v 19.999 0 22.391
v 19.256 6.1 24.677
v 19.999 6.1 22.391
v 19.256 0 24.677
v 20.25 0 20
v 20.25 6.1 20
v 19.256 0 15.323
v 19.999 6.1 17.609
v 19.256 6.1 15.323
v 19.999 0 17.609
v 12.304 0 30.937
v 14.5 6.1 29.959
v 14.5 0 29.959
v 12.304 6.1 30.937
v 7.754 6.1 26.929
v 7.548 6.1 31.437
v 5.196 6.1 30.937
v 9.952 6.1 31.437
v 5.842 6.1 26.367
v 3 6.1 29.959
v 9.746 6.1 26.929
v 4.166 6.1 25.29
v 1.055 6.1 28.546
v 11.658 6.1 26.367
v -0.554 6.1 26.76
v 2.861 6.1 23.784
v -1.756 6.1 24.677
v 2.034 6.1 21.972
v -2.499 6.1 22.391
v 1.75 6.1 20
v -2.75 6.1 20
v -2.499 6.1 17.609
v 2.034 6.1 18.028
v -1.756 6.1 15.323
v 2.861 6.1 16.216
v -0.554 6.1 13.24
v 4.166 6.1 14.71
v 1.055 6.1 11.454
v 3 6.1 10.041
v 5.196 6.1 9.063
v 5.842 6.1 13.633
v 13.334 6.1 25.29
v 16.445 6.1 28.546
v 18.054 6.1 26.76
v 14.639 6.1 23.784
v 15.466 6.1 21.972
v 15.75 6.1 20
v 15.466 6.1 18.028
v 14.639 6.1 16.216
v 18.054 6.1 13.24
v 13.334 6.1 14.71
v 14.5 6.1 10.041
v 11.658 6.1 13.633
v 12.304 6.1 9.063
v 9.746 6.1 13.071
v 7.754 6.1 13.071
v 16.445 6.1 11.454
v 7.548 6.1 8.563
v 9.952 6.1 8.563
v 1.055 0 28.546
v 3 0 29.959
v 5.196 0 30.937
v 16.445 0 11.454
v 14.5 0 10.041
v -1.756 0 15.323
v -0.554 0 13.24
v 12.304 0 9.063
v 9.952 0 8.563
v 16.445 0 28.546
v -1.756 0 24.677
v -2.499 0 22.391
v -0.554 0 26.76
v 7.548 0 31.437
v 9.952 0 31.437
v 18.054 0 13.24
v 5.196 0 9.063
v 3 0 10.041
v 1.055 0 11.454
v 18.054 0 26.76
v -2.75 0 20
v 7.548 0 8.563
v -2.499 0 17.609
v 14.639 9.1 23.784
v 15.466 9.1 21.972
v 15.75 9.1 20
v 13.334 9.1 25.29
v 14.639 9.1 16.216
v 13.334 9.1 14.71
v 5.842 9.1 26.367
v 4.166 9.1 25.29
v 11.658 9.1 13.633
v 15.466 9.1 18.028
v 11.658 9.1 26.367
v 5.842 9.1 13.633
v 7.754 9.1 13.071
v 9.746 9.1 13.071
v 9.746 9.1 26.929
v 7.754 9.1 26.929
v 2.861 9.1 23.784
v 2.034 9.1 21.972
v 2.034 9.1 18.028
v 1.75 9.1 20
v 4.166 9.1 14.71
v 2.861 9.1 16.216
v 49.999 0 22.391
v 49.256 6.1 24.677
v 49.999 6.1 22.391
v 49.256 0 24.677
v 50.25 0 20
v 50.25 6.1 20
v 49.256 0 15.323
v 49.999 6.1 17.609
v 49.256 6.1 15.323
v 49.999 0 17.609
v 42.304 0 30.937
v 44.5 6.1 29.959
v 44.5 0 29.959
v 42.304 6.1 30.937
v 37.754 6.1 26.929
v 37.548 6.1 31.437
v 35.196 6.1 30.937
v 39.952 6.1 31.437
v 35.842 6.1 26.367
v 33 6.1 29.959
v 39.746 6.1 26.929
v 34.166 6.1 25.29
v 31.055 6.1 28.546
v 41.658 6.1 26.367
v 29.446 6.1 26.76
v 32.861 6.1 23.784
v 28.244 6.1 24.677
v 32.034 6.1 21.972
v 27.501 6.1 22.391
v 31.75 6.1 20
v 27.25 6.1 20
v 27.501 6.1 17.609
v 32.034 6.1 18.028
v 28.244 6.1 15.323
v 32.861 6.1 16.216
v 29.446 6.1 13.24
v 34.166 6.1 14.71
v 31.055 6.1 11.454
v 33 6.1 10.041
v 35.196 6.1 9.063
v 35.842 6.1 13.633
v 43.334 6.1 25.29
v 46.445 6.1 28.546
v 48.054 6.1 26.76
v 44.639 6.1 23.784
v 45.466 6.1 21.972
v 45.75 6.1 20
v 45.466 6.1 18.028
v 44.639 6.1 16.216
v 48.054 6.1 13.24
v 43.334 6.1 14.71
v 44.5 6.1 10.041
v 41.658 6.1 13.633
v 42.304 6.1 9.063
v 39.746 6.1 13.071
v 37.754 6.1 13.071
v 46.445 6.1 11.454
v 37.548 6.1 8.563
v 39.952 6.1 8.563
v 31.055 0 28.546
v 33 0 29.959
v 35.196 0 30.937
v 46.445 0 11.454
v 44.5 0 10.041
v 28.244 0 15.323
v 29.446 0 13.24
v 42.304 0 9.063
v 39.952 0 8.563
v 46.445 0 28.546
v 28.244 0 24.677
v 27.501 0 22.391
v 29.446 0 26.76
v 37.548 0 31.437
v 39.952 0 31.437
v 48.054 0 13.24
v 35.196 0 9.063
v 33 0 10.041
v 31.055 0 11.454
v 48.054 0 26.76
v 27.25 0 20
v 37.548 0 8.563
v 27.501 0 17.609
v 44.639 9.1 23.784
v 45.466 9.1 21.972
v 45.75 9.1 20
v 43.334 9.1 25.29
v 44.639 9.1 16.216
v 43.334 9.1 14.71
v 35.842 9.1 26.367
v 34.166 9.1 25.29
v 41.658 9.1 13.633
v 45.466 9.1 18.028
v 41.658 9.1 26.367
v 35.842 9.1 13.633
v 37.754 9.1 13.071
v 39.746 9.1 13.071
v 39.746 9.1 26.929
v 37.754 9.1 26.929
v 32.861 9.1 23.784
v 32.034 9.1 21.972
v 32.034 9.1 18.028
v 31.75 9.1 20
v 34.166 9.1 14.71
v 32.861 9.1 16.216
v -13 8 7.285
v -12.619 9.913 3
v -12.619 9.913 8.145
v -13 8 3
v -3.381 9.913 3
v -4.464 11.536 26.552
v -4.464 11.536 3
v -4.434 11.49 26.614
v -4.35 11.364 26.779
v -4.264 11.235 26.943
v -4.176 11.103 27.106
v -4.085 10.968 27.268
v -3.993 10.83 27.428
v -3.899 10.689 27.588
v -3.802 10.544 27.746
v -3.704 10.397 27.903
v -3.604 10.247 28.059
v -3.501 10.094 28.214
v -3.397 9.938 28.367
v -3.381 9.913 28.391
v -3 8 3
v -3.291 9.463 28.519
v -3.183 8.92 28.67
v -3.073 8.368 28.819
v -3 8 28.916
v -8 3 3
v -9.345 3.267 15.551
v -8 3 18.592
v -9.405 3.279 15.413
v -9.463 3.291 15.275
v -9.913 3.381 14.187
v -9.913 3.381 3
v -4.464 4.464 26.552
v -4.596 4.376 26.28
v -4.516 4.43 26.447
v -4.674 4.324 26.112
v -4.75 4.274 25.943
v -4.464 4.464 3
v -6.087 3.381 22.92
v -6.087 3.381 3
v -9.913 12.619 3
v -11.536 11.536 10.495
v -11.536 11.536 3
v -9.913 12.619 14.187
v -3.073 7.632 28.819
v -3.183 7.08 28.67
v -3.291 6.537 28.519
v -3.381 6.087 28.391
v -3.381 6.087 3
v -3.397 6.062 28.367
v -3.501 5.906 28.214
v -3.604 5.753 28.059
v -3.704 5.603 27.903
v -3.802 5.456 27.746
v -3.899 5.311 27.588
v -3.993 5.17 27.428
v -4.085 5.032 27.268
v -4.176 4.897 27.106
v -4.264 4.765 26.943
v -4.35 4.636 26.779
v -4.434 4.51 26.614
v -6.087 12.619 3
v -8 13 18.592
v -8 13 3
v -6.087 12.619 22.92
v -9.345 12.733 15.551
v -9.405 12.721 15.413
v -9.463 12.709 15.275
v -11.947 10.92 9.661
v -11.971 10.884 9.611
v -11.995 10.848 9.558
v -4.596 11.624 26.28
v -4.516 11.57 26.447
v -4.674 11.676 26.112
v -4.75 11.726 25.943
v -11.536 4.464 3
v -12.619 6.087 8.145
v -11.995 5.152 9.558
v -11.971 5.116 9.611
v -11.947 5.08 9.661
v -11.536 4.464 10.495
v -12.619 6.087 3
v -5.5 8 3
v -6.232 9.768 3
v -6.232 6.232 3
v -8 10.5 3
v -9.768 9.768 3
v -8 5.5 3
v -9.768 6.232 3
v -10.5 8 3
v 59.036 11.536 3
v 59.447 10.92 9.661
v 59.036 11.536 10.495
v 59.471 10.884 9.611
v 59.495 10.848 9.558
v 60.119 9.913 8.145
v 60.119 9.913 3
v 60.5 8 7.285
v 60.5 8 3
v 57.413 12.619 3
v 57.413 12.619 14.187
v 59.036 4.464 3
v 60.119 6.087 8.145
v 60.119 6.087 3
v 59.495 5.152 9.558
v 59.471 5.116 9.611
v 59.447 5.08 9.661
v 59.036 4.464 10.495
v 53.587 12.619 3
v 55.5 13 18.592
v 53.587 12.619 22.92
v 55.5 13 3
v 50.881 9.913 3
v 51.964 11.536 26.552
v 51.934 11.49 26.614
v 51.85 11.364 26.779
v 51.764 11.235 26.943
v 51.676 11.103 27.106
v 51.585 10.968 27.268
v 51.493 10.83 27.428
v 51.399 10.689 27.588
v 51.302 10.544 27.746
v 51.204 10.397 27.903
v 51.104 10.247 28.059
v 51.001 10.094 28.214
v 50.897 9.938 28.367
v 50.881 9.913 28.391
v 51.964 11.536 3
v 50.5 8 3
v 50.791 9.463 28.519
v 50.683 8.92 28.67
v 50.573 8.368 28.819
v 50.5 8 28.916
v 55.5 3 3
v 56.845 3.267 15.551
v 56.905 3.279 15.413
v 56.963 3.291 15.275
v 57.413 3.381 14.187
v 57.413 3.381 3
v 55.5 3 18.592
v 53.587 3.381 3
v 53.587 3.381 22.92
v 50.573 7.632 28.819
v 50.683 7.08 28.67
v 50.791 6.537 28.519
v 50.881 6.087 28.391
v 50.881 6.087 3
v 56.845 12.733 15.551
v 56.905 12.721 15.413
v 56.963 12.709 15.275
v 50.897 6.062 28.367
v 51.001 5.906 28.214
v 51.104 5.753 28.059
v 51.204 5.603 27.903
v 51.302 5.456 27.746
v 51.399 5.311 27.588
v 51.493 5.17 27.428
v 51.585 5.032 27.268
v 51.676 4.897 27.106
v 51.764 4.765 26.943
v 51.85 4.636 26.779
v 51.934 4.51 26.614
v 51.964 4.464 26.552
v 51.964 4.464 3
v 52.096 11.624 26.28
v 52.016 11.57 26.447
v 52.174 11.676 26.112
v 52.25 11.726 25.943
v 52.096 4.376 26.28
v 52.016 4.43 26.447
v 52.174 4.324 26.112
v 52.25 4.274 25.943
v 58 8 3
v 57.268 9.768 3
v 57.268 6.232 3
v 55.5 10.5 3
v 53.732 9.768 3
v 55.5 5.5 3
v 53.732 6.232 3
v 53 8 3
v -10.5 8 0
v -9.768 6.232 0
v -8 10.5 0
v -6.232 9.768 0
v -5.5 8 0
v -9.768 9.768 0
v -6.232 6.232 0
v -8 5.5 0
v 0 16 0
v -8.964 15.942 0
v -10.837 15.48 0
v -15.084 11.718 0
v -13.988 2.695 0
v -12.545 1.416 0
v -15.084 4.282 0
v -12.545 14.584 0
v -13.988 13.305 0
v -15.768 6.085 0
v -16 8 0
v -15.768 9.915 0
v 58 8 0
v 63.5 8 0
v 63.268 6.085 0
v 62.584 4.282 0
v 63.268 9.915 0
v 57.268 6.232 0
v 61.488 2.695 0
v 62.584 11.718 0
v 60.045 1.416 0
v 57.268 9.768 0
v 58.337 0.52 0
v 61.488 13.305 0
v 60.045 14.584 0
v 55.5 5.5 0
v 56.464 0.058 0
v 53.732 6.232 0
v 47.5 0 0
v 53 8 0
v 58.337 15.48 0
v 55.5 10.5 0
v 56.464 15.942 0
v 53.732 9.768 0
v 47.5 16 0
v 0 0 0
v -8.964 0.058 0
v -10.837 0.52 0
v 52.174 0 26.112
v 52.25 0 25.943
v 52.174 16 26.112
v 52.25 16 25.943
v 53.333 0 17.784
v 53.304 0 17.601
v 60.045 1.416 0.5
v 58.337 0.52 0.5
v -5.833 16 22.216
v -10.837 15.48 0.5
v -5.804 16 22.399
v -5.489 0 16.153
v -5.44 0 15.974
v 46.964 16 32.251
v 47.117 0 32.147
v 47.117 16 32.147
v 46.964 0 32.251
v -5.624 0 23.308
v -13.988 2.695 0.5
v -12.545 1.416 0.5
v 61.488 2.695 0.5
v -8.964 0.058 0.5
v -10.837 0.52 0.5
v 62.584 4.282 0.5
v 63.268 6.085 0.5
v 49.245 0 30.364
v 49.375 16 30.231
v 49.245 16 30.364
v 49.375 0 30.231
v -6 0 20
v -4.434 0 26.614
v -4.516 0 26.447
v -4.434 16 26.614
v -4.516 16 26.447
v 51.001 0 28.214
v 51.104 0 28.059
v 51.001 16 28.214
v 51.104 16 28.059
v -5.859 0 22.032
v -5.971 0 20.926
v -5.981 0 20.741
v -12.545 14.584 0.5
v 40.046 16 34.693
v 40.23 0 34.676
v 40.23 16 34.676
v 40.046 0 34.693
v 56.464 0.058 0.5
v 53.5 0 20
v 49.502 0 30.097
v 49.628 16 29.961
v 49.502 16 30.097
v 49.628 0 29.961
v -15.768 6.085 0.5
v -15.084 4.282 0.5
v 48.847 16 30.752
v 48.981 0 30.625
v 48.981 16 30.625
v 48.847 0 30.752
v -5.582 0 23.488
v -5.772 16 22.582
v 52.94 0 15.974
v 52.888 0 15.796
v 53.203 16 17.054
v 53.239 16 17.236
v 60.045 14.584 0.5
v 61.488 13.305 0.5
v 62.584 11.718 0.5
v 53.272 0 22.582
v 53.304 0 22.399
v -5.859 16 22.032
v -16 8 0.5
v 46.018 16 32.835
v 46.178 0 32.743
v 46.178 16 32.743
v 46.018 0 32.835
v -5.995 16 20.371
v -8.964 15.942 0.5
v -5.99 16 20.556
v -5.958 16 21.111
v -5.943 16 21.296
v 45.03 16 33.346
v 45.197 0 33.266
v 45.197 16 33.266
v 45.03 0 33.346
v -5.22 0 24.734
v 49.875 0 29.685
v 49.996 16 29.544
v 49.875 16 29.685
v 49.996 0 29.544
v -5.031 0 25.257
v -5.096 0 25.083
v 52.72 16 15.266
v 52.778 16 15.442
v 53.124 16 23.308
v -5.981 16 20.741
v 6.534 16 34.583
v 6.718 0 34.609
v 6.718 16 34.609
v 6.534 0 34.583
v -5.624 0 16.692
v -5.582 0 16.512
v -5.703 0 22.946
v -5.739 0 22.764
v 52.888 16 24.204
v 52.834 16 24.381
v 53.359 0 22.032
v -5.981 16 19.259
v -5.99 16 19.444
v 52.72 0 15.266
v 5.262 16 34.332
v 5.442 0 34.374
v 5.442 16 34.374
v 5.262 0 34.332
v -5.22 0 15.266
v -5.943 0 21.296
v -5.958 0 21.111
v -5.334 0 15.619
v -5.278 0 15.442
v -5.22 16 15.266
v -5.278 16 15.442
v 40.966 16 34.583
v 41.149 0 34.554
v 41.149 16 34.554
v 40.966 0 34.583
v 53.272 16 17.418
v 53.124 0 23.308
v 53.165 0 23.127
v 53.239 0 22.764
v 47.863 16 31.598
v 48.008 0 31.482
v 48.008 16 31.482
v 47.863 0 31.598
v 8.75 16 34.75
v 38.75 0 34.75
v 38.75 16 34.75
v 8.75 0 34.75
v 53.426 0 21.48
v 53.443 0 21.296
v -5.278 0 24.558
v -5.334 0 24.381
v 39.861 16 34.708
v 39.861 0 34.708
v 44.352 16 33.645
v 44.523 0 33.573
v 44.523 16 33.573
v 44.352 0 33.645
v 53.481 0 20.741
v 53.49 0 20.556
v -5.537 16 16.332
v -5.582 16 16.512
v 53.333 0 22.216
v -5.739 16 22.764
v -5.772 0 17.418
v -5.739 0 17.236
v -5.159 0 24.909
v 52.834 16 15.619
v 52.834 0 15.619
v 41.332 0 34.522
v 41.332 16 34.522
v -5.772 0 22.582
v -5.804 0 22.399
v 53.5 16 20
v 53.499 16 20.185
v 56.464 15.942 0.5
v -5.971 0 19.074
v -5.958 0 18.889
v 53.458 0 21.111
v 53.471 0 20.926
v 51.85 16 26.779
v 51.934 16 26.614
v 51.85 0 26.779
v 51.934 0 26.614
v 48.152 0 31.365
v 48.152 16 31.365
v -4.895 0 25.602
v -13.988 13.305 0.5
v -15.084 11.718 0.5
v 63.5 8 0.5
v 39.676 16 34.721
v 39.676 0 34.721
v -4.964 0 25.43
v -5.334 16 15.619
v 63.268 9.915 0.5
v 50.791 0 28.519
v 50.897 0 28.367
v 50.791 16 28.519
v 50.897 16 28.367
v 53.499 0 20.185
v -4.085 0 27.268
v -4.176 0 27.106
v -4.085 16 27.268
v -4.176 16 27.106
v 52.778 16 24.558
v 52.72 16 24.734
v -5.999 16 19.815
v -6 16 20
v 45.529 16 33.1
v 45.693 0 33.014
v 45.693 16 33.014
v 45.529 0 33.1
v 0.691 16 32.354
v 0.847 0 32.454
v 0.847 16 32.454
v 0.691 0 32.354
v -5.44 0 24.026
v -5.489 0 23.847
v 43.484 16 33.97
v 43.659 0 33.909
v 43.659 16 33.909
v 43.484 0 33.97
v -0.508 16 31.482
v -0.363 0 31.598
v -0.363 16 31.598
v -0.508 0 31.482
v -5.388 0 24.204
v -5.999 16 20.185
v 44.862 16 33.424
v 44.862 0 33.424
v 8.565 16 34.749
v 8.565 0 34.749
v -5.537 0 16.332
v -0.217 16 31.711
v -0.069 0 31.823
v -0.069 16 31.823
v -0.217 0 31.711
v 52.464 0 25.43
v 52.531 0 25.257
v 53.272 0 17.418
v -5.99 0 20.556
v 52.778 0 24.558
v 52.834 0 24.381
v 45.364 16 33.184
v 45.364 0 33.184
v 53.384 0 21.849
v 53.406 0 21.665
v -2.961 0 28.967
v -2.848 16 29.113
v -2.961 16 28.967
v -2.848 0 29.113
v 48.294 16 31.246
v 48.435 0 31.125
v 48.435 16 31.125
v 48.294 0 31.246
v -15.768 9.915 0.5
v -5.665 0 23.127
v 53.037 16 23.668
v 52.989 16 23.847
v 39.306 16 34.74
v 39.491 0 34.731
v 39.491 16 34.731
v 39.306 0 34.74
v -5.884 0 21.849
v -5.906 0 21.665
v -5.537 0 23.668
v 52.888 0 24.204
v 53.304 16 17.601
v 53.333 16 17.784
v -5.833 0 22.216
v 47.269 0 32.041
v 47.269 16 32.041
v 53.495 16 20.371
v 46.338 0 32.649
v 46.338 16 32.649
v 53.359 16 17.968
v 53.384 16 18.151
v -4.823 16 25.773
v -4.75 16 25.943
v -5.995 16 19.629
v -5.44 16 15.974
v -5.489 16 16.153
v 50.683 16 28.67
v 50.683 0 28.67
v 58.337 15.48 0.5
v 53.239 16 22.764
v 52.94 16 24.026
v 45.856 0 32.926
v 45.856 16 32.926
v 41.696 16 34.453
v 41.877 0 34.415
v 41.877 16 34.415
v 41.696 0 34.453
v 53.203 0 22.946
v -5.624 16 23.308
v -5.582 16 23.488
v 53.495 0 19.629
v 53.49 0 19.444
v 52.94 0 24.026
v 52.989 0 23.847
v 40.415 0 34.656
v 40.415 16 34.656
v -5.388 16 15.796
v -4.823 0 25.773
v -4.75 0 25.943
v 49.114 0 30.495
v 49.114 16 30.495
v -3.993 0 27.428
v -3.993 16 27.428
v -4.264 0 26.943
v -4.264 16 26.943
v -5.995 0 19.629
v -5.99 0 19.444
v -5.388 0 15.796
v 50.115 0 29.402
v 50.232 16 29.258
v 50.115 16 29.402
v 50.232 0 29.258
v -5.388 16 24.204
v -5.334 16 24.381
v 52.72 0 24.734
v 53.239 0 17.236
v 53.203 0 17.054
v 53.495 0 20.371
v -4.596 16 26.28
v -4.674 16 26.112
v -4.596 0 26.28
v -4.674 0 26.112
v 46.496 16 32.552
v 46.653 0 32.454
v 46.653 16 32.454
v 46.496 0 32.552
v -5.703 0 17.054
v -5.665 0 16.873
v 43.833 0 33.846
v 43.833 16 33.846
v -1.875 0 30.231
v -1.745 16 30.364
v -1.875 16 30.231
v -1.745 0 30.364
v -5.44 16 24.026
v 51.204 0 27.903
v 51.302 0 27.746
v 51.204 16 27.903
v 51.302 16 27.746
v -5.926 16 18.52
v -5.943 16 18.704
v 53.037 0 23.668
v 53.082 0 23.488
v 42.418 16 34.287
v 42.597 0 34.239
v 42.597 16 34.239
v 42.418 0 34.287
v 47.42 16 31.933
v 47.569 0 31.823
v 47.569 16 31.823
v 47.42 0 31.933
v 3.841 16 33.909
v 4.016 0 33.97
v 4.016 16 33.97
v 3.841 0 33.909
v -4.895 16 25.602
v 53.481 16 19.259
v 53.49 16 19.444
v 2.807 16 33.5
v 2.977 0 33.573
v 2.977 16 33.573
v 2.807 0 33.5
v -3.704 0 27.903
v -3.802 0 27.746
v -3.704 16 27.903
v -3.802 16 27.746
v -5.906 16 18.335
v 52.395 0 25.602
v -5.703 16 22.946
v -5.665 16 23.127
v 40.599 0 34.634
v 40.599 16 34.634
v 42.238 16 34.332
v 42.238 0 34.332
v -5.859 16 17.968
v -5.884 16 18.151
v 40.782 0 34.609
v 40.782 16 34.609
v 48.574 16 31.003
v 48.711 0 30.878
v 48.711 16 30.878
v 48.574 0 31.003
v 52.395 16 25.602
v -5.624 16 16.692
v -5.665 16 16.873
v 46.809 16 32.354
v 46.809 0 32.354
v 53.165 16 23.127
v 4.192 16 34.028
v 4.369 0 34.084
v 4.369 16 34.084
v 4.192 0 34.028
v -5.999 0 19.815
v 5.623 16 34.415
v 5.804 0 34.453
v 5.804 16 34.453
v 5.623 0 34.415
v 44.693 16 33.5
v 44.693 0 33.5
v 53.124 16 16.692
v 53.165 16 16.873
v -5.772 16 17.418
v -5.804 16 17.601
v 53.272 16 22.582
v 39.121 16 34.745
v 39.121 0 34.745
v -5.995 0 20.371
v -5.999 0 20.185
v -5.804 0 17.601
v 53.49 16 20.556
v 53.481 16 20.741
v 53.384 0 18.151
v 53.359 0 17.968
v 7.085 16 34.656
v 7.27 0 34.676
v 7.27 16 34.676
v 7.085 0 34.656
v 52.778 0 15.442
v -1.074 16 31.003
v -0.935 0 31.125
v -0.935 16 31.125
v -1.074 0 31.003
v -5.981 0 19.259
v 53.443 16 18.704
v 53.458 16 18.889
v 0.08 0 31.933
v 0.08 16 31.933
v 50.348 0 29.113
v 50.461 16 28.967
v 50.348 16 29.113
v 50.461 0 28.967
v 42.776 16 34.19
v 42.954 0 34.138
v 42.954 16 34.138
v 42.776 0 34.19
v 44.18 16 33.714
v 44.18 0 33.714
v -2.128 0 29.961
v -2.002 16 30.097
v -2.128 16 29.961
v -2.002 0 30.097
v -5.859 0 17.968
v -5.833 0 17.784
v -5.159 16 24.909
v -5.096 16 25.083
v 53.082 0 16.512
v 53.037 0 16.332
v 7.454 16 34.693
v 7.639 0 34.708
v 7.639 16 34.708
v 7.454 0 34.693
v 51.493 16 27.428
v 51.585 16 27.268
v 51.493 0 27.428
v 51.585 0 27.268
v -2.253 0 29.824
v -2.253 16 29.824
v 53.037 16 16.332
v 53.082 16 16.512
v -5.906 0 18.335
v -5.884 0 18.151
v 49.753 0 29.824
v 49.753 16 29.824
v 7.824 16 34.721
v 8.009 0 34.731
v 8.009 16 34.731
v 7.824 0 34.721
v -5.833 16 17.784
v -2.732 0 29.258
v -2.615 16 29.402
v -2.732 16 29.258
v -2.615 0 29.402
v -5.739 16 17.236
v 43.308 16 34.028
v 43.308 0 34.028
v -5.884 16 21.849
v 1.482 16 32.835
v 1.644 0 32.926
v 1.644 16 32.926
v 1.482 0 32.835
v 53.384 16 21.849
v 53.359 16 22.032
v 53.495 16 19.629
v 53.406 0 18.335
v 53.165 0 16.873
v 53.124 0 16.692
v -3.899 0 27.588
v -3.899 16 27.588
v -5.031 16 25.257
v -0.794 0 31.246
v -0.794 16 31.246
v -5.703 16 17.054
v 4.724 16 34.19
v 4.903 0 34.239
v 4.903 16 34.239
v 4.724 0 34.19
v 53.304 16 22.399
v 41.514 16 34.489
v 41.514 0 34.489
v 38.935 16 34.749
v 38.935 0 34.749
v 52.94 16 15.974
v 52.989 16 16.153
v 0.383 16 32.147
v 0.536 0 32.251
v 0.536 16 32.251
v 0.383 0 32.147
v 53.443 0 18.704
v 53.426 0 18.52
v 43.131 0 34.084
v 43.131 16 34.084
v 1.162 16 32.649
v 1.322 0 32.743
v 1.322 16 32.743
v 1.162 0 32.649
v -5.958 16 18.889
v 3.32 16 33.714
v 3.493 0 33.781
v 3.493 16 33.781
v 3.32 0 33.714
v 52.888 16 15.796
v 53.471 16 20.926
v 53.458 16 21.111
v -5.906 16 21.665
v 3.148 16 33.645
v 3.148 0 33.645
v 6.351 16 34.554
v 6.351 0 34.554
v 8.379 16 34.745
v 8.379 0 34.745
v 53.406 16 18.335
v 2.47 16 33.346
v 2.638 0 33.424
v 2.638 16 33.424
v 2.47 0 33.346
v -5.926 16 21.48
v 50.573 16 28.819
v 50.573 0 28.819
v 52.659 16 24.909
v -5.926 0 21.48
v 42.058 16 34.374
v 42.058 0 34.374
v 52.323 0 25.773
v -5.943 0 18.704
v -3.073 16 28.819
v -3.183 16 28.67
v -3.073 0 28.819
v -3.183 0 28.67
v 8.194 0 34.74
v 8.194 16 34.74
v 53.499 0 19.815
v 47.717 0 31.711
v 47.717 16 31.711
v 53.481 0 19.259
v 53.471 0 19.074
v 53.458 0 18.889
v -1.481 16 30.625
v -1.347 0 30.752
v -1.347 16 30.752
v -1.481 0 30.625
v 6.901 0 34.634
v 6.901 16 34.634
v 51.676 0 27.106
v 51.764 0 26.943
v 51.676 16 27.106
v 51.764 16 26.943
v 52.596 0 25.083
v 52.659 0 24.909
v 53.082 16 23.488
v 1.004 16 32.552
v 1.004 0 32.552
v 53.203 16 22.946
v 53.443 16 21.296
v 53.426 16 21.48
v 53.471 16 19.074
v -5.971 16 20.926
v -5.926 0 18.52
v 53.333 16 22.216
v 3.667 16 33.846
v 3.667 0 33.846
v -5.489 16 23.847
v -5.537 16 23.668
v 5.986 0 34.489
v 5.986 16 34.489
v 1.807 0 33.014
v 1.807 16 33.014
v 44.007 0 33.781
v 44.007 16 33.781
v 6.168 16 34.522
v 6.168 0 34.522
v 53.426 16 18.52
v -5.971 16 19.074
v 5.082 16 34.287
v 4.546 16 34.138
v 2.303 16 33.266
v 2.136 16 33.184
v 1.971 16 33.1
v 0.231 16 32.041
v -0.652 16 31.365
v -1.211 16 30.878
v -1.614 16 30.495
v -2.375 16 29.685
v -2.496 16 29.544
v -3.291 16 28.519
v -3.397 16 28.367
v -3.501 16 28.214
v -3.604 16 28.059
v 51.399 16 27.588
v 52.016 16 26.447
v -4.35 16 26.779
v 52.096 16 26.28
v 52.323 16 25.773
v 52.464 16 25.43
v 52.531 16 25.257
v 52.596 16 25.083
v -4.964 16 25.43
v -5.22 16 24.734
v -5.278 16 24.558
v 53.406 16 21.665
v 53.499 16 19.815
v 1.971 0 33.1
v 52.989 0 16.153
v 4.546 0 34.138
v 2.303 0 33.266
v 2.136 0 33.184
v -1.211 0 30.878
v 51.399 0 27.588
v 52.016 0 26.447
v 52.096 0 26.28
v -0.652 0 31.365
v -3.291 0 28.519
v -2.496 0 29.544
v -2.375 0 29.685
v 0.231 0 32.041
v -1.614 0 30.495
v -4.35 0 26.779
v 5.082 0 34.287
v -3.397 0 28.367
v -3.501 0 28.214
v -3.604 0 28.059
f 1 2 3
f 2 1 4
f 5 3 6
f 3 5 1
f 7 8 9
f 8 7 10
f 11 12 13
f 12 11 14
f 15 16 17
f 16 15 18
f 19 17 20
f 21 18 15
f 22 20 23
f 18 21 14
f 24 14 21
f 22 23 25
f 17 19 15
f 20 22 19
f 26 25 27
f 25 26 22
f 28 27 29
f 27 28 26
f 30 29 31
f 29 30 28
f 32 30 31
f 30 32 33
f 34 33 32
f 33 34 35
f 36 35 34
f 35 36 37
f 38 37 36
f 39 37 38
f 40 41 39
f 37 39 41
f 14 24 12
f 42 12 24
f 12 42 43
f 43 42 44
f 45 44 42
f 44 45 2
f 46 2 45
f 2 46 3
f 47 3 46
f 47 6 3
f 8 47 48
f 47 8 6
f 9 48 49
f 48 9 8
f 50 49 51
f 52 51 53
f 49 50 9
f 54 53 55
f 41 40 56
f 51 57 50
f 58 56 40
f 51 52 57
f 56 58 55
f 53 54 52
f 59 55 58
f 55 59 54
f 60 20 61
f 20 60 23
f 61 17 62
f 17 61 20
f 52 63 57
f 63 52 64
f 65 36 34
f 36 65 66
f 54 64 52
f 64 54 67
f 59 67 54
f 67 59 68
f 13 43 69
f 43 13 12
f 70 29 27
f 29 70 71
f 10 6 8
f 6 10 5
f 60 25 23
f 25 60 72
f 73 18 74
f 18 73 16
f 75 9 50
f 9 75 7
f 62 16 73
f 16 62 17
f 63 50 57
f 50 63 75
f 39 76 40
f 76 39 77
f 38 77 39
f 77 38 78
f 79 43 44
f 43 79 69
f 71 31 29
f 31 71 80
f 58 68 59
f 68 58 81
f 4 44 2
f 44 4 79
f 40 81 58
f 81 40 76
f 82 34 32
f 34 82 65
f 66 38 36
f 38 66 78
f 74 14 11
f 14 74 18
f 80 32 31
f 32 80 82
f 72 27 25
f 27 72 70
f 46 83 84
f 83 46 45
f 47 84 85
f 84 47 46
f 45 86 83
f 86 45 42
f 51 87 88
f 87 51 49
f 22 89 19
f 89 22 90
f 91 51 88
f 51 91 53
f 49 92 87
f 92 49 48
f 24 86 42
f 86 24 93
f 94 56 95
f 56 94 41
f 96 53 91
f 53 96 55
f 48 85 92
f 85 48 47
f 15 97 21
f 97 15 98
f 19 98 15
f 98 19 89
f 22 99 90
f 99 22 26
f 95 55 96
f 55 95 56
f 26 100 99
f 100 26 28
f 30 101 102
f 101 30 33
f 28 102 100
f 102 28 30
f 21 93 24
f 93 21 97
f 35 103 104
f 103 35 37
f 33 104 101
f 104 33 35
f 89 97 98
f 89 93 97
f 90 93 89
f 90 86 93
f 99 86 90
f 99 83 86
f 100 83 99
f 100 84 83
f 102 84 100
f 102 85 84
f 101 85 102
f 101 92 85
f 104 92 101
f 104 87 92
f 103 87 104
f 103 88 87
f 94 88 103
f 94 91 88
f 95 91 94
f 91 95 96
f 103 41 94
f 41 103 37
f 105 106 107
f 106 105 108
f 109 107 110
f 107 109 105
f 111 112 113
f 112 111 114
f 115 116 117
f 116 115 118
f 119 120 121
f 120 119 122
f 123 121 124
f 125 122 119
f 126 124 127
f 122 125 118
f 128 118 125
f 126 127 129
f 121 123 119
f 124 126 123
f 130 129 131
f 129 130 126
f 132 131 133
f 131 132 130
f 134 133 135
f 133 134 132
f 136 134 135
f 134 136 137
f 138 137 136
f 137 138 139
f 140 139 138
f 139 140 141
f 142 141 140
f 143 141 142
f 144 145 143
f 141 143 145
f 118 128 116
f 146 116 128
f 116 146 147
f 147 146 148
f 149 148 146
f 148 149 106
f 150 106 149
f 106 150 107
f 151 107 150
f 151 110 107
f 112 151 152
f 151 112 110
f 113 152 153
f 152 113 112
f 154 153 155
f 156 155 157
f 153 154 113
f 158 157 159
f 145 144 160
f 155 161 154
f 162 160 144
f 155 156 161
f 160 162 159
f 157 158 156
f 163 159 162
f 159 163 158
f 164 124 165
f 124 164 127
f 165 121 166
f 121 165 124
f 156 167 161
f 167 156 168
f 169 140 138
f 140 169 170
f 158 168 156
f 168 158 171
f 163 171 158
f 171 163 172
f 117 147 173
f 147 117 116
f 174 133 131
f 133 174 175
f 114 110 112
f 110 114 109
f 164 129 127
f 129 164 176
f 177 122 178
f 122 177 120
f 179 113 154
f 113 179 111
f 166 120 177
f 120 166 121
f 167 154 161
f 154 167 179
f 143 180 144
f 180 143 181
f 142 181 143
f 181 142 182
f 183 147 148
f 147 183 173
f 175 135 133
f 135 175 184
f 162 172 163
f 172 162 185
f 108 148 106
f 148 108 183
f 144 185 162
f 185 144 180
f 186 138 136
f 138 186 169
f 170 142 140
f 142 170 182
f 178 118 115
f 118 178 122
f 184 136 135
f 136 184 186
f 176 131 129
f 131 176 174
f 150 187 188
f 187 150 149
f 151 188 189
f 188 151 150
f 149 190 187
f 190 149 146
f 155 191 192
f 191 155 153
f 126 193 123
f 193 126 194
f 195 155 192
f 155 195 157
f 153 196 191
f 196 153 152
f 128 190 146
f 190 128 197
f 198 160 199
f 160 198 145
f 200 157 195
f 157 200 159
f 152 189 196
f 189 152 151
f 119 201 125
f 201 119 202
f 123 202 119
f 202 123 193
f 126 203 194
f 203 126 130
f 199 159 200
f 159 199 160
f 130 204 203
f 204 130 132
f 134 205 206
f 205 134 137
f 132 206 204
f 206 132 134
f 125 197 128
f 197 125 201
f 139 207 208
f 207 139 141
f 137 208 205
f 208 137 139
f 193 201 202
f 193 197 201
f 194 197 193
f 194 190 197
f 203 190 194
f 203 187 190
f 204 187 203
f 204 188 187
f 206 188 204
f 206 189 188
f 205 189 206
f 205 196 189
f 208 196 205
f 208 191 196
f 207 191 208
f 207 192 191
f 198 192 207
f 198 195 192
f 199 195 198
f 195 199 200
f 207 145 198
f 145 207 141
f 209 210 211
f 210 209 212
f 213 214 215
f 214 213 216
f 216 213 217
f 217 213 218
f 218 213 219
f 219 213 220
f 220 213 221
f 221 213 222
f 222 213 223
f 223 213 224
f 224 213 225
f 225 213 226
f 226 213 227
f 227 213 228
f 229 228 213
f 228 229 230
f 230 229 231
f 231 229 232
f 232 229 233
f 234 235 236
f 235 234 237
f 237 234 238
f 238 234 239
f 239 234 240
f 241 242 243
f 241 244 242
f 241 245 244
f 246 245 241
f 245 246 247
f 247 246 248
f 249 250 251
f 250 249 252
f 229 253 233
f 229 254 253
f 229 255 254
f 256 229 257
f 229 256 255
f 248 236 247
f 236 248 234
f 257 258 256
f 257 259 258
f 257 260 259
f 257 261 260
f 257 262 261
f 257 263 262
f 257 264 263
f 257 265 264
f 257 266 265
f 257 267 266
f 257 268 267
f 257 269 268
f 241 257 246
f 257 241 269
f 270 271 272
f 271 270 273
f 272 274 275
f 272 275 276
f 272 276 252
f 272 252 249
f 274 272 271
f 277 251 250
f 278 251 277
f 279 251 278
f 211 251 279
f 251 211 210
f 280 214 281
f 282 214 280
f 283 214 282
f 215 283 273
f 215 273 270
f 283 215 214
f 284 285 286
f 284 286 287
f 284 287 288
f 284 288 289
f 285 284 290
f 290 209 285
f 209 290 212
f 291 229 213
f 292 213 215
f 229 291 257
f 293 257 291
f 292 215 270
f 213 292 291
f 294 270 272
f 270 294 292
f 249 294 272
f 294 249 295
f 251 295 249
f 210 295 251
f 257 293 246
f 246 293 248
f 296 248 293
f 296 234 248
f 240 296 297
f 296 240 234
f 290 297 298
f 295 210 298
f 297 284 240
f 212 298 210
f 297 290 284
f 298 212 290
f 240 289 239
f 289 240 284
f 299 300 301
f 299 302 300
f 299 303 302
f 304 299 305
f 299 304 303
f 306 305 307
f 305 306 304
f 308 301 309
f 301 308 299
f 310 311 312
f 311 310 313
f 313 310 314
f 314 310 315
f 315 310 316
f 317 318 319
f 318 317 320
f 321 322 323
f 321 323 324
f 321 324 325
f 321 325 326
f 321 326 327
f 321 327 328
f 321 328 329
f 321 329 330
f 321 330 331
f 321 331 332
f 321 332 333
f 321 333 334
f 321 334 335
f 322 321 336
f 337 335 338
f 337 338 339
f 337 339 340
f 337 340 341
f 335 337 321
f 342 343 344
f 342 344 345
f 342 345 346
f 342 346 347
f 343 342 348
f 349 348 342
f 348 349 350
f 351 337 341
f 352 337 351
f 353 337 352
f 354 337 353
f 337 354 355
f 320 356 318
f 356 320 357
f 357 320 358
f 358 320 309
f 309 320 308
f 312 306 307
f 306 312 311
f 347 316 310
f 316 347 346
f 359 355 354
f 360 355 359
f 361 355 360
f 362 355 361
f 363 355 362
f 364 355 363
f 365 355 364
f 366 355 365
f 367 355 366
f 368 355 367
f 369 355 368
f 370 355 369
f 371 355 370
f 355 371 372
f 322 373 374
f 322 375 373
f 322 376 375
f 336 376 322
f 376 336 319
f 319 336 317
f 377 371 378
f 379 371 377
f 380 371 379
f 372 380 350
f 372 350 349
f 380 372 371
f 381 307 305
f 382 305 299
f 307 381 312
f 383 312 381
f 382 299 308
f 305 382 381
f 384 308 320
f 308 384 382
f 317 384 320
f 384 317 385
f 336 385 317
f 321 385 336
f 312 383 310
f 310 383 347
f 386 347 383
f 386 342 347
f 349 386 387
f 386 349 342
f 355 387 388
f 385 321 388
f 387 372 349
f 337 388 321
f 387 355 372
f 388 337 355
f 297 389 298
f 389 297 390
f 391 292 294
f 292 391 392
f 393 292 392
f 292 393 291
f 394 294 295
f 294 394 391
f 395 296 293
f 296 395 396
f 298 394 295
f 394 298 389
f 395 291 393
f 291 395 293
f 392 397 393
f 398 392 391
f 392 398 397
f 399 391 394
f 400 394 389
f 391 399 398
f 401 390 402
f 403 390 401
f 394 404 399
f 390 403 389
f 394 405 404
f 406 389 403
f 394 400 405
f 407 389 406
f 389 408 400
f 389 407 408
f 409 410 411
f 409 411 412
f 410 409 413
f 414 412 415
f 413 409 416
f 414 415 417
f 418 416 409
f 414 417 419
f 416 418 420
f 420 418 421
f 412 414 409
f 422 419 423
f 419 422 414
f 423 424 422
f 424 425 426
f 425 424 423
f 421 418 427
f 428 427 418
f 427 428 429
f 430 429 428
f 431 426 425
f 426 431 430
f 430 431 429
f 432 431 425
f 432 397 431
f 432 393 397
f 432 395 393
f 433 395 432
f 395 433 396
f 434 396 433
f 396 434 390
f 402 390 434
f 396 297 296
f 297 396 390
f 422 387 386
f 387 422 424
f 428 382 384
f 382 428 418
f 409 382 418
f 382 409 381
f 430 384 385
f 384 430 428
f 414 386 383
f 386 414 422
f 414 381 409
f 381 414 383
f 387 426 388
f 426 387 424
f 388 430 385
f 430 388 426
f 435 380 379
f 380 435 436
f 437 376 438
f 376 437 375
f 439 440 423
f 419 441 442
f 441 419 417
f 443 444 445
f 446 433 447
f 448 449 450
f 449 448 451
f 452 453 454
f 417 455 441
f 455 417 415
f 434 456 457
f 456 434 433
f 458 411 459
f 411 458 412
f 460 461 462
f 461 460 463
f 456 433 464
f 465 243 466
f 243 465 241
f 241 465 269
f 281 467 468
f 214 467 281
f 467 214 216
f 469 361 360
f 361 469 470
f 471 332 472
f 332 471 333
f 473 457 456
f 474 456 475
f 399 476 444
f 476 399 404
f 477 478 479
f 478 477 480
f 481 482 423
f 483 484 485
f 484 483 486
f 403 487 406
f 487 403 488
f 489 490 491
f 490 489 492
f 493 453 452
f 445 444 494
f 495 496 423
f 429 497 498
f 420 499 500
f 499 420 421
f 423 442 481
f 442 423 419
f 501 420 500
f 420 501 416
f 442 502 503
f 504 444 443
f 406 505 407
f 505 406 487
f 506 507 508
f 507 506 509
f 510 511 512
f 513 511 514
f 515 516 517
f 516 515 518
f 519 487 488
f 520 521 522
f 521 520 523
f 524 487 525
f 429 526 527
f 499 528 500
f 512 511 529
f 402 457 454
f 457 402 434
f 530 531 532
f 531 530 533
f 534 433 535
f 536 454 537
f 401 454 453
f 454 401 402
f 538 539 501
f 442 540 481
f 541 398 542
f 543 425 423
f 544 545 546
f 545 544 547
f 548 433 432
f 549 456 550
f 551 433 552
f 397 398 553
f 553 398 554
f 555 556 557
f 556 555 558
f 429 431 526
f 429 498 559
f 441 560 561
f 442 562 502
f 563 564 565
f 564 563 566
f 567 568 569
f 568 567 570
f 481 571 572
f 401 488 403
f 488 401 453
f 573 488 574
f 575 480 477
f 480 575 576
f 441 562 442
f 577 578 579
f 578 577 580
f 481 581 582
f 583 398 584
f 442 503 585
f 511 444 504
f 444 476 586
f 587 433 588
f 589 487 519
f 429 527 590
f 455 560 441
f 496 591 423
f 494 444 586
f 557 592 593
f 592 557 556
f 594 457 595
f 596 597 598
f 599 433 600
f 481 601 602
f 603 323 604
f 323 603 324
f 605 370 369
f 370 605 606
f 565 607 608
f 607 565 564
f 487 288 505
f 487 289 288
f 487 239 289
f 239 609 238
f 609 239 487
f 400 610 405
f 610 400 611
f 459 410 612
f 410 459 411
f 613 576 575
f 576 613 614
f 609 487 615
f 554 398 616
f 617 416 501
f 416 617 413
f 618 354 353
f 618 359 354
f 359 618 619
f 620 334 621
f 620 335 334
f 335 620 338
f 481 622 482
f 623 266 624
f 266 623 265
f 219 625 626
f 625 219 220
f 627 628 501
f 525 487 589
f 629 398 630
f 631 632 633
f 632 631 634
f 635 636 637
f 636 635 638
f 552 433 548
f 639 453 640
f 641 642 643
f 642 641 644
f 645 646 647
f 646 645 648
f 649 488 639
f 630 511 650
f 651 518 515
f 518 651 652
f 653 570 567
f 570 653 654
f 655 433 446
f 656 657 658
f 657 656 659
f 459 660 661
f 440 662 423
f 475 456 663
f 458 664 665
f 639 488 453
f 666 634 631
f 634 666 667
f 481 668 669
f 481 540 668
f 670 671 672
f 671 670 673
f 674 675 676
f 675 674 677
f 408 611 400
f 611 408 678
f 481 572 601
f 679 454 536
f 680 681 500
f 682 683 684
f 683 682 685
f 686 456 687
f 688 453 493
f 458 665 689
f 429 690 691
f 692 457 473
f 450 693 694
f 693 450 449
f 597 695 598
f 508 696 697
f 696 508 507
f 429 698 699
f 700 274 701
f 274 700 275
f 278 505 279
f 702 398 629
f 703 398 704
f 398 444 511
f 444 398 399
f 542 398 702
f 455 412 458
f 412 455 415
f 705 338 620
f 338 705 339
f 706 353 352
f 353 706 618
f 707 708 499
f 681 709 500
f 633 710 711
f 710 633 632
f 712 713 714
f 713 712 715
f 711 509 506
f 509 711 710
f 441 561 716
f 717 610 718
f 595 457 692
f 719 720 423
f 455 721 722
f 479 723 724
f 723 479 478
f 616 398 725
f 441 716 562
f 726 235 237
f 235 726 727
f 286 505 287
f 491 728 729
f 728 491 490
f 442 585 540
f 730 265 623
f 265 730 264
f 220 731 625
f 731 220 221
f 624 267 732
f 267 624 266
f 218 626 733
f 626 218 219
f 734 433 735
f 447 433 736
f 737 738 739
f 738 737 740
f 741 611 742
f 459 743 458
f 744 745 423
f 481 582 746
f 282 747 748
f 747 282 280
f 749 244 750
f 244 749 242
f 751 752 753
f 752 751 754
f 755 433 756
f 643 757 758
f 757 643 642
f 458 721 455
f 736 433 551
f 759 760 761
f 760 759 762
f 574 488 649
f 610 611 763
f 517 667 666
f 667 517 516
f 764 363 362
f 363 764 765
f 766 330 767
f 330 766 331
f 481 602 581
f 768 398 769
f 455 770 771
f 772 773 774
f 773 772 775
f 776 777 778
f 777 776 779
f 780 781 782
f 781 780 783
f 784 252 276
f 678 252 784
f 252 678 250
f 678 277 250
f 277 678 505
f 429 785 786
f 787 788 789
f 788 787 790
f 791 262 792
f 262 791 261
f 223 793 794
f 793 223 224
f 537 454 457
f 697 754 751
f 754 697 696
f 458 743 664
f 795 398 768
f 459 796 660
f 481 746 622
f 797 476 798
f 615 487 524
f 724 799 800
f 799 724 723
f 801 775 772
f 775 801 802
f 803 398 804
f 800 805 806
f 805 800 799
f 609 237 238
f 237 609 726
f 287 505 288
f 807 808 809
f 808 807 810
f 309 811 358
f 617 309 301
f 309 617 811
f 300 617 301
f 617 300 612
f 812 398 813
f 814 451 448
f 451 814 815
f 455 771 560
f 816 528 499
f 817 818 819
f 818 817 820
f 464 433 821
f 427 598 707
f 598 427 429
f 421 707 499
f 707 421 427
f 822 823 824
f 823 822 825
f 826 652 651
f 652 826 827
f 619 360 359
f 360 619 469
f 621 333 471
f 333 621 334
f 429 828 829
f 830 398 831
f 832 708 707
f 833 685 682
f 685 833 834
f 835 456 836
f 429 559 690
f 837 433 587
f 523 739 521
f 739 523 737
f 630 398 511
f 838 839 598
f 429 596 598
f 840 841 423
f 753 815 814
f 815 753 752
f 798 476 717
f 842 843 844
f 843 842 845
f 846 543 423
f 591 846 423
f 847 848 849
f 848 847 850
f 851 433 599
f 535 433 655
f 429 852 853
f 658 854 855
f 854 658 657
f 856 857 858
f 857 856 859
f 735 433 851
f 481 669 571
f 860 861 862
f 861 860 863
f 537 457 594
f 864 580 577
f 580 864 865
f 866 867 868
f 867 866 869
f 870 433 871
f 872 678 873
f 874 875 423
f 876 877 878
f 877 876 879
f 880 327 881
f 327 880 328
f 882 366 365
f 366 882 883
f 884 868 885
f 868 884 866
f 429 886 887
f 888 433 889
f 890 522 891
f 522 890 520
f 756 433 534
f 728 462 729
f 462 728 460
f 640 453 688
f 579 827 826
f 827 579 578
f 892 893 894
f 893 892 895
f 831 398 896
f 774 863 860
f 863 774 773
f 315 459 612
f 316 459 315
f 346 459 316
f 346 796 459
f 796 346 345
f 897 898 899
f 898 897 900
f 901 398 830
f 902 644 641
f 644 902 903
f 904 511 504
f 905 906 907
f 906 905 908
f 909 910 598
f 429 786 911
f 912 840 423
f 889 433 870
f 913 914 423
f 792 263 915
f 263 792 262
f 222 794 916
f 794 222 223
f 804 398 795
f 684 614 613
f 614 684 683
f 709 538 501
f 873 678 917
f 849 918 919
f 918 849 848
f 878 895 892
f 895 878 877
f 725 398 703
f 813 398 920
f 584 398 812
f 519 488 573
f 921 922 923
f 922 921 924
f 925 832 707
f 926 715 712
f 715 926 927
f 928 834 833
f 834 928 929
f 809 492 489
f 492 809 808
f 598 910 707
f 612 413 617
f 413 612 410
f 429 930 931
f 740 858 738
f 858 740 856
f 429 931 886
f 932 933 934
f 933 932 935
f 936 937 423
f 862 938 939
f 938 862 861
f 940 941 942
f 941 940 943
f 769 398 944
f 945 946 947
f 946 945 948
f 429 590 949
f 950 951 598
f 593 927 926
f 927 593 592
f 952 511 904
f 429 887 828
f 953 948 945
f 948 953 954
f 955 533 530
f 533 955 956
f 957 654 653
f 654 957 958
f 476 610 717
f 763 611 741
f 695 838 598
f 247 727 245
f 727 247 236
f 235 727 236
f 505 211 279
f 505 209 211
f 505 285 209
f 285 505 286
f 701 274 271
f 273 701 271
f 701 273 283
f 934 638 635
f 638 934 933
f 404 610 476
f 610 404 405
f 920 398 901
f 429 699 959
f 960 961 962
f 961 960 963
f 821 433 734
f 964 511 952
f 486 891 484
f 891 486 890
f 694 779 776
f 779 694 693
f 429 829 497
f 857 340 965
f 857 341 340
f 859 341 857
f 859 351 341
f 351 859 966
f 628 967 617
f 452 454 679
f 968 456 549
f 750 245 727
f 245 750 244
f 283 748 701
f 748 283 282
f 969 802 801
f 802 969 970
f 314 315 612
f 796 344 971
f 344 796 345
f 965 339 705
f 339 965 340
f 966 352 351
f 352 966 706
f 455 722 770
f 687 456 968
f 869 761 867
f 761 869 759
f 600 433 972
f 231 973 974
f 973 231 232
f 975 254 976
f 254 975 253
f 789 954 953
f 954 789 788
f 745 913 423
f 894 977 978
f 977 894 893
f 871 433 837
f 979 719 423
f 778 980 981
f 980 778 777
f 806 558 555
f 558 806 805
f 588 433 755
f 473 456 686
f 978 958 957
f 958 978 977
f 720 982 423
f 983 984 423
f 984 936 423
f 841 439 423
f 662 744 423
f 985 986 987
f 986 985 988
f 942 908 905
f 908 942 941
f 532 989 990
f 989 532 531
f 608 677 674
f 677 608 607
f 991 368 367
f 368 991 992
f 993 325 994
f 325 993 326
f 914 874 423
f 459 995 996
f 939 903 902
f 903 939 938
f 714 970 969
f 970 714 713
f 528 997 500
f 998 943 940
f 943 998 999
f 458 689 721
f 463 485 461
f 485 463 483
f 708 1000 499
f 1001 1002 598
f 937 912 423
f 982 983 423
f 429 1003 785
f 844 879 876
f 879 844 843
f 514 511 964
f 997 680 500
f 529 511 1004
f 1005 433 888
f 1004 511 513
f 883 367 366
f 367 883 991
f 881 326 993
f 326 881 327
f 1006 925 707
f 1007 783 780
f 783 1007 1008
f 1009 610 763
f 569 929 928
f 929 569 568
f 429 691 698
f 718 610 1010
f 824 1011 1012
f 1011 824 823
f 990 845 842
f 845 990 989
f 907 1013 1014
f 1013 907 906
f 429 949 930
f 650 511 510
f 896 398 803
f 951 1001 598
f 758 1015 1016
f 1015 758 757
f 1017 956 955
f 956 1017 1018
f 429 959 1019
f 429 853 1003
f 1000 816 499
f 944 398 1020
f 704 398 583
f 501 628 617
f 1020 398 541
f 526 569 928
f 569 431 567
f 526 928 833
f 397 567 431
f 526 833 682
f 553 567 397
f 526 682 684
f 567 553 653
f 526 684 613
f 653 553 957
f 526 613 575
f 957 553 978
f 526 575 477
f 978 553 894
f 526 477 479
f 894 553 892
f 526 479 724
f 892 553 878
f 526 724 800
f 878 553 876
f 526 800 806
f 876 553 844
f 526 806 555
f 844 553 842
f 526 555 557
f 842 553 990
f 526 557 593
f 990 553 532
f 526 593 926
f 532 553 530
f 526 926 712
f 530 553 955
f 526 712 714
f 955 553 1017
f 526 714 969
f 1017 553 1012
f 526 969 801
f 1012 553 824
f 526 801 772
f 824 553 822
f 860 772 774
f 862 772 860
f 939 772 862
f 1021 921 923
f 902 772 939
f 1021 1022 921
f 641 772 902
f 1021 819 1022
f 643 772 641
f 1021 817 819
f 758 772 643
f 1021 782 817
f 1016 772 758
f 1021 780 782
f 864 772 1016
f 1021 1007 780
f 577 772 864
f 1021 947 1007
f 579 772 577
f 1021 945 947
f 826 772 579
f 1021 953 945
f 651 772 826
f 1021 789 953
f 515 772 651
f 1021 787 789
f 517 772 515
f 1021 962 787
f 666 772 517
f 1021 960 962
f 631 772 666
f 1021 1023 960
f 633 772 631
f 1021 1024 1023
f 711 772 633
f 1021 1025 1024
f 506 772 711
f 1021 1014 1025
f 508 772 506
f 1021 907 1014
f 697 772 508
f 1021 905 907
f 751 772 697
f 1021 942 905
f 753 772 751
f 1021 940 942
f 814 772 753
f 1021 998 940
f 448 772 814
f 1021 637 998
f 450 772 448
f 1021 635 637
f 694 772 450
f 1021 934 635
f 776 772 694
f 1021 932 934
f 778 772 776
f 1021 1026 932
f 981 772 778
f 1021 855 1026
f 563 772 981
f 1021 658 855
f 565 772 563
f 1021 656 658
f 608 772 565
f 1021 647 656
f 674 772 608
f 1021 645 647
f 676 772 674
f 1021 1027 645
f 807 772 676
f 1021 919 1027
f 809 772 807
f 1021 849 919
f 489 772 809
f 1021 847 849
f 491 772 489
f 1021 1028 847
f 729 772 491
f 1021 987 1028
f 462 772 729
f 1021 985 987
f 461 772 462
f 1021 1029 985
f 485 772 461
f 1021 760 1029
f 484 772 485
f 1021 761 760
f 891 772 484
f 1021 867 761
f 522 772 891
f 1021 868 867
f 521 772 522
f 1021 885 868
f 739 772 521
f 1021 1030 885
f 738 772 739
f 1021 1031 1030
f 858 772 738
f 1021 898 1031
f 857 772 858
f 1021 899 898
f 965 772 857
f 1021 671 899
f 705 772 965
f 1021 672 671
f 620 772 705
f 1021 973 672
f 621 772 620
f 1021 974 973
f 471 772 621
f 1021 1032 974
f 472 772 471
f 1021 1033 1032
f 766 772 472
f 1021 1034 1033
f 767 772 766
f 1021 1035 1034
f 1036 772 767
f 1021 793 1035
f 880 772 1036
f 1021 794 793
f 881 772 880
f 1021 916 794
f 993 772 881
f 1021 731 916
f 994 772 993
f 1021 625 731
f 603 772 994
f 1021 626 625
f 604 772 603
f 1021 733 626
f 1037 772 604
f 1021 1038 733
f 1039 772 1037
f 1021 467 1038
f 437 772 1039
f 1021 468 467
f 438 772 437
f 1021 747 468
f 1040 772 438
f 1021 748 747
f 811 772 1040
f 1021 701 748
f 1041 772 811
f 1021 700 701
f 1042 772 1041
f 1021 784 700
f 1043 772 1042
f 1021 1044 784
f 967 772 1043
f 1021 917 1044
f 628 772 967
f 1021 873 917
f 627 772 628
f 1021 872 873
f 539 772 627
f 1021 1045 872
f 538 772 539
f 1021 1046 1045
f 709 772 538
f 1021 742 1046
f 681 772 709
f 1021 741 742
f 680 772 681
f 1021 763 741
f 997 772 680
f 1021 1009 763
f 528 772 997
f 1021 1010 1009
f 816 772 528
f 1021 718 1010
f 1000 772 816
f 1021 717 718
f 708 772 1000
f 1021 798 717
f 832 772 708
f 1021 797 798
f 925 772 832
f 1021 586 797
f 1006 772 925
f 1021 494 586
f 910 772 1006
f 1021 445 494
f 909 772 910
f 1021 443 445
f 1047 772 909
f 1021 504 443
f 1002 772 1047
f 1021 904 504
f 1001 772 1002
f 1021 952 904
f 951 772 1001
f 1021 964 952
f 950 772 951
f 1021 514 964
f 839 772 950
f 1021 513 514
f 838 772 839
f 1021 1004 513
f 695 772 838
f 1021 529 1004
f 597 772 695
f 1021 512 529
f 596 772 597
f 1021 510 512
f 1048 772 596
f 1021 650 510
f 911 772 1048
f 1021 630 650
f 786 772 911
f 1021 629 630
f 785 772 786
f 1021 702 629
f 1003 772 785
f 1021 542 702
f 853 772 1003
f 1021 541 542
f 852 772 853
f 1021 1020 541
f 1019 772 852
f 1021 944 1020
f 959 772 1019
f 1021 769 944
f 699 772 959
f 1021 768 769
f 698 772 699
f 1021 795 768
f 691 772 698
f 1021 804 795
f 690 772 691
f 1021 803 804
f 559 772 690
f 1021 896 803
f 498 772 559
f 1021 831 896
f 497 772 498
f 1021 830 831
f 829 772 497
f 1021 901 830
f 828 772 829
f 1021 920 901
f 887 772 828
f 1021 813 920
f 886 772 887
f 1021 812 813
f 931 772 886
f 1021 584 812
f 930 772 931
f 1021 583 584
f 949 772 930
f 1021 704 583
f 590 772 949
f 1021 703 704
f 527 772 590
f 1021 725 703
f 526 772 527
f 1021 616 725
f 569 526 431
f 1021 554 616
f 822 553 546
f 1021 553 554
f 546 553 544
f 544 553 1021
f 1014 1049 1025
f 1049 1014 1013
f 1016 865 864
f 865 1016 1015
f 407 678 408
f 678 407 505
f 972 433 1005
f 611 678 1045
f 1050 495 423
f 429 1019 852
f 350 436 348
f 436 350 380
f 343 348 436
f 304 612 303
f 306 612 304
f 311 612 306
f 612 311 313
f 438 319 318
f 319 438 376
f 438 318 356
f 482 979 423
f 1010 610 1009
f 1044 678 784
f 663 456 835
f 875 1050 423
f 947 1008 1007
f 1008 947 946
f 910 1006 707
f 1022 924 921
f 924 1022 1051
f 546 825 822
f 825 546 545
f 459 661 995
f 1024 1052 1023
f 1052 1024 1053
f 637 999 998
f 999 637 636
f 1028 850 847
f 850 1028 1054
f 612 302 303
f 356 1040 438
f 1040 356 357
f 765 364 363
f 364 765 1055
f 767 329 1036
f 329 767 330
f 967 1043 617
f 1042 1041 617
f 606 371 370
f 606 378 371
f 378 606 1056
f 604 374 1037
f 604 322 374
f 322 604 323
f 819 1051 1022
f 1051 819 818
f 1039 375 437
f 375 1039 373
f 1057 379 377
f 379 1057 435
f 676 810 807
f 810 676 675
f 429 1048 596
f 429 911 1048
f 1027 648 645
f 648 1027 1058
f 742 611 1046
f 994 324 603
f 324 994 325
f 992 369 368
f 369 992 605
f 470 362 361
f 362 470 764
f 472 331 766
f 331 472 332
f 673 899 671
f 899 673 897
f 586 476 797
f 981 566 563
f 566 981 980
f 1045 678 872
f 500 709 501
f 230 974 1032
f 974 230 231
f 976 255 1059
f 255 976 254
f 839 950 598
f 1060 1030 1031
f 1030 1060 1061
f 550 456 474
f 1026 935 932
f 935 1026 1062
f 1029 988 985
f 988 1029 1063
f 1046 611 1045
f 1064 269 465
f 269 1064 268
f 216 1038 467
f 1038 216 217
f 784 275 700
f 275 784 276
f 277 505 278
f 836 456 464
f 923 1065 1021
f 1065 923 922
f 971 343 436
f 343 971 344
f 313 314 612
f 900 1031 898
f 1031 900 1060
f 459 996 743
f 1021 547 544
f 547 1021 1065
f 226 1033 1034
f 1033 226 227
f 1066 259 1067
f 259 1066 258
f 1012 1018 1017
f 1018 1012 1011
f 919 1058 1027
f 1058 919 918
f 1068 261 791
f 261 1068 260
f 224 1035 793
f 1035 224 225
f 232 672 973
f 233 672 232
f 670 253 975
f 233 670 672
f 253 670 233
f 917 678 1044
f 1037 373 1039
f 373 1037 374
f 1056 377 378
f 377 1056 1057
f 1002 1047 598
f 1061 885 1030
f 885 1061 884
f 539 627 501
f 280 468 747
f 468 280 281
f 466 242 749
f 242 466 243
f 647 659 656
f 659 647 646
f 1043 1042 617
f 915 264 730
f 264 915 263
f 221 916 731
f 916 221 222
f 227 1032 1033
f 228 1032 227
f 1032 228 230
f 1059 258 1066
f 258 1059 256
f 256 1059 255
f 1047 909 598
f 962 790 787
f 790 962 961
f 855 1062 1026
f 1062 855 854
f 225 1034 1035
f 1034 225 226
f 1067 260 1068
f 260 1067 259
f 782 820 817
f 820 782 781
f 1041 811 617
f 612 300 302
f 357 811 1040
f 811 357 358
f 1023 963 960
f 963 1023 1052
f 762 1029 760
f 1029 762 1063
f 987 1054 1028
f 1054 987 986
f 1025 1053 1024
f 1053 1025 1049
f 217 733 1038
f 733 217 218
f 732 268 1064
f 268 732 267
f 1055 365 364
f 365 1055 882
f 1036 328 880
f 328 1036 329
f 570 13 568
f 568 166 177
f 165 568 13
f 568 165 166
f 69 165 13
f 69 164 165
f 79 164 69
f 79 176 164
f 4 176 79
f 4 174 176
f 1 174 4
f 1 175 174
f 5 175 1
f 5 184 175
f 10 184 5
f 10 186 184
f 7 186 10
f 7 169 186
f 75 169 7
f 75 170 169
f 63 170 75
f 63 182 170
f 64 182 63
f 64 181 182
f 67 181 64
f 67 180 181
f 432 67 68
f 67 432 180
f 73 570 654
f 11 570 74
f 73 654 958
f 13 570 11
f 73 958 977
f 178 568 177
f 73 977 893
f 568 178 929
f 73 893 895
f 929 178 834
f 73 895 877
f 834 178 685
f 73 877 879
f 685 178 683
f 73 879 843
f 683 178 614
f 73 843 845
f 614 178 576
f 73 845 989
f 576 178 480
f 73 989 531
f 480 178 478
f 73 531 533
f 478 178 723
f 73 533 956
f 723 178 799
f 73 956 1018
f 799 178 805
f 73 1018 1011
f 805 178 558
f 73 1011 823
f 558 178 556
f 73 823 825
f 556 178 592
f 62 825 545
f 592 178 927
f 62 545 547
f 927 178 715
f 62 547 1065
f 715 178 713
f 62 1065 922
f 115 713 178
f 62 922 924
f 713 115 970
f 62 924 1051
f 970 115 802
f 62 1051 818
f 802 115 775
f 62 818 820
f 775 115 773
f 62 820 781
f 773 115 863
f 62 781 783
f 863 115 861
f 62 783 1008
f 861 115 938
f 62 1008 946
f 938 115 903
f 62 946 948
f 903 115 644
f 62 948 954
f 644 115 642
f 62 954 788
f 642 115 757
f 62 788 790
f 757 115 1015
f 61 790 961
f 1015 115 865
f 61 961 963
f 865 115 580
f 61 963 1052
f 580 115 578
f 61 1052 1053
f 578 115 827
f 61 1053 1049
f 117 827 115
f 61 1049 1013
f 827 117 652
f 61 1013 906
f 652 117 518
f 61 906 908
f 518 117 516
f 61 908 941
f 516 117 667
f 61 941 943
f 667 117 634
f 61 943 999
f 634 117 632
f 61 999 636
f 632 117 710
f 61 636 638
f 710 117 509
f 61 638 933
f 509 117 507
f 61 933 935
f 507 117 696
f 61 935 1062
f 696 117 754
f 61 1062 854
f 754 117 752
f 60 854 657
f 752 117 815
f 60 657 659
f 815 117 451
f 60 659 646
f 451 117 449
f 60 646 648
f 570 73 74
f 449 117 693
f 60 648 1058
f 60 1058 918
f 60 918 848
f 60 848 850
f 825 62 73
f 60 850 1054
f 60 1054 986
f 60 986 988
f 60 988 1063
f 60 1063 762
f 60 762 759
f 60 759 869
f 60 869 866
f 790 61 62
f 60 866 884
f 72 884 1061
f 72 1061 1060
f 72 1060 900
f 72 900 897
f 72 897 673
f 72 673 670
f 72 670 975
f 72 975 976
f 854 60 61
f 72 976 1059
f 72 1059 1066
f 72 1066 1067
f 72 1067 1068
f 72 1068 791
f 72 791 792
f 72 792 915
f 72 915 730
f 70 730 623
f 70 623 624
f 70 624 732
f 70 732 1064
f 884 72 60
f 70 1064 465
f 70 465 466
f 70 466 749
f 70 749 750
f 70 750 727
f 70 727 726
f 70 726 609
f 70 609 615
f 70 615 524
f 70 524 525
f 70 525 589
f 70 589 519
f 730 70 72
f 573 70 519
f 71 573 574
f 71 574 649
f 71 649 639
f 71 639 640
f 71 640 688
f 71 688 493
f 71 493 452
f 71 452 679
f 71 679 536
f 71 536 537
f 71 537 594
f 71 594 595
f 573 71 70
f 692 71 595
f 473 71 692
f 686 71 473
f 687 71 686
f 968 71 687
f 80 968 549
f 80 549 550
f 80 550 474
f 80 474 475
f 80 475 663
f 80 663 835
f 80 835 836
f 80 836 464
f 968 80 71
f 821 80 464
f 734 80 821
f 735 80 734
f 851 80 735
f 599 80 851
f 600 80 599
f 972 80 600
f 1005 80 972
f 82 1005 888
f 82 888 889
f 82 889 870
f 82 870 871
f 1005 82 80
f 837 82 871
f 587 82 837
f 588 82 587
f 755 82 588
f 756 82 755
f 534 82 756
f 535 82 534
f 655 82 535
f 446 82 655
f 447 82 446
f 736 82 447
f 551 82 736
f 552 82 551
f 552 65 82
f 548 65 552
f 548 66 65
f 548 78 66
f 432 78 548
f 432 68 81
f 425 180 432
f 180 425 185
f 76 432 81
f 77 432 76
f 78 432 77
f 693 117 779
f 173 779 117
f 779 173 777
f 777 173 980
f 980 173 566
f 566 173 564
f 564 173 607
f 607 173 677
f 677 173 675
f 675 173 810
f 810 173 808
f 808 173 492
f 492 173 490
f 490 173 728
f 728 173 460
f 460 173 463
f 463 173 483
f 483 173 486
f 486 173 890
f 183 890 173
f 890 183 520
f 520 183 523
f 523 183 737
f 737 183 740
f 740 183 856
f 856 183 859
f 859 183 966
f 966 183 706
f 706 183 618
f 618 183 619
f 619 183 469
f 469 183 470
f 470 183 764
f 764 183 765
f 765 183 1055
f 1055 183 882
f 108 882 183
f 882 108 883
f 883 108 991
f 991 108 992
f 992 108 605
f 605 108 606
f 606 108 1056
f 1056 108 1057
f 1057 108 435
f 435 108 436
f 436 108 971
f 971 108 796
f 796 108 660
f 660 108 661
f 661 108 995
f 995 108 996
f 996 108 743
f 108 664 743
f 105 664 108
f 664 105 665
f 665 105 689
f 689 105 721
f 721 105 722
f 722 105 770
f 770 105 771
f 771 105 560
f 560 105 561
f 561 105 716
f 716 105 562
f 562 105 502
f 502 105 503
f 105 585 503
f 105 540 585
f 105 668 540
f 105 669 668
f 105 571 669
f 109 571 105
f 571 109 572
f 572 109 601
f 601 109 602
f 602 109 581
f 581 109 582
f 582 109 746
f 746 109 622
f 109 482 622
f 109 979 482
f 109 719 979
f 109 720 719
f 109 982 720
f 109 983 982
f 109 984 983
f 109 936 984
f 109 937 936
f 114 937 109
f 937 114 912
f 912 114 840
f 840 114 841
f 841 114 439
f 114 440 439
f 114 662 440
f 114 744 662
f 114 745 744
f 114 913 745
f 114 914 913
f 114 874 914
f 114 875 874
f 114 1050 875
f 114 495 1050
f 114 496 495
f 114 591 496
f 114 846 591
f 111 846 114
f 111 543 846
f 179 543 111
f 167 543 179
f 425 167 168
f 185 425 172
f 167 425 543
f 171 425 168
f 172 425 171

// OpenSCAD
// Essential parameters:
bearing_qty = 2;
bearing_height = 20; // Height to elevate bearing hub
bearing_radius = 11.5; // Bearing radius
bearing_depth = 7.1; // Bearing depth
bearing_gap_radius = 7; // Extra gap for hub of bearing radius

screw_radius = 2.5;
screw_head_radius = 5;

// Advanced options:
mount_thickness = 3; // Thickness of mount parts
mount_screw_distance_multiple = 2.5; // Distance of mount screws from front
rear_support = 0; // 0 for no rear support, 1 for rear support.

// Derived properties:
base_height = mount_thickness;
riserWidth = bearing_radius + mount_thickness * 2;
riserHeight = bearing_height + bearing_radius + mount_thickness;
screw_distance = mount_screw_distance_multiple * riserHeight;
side_screw_area_r = screw_head_radius + mount_thickness;
base_depth = side_screw_area_r * 2;

// THE CODE:
theModel(bearing_qty, 30);

module theModel(quantity, distance){
  difference(){
    body(quantity, distance);
    holes(quantity, distance);
  }
}

module body (quantity, distance) {
  hull(){
    for(x=[0:quantity-1]){

      translate([x * distance, 0, 0])
        supportTower(x, distance);


      if (rear_support == 1)
      translate([x * distance, 0, 0])
      base(quantity, distance);
    }

    sideScrewSupports(quantity,
                      distance,
                      side_screw_area_r,
                      0.5);
  }
}

module sideScrewSupports( quantity, distance, base_radius, thickness ){

  first_offset = side_screw_area_r * -1;
  sideCylinder( first_offset, thickness, base_radius );

  second_offset = distance * (quantity-1) + riserWidth + side_screw_area_r;
  sideCylinder( second_offset, thickness, base_radius );

}

module sideCylinder( centerOffset, height, radius ) {
  translate([centerOffset, side_screw_area_r, 0])
  cylinder(r=radius, h=height);
}


module holes (quantity, distance) {
  for(x=[0:quantity-1]){
    translate([x * distance, 0, 0])
    bearingHole();

    translate([x * distance, 0, 0])
    mountScrewHole(screw_radius);
  }

  for(x=[0:quantity-1]){
    translate([x * distance, 0, 0])
    mountScrewHole(screw_head_radius);
    translate([x * distance, 0, -mount_thickness])
    mountScrewHole(screw_radius);
  }

  // Side Screw Holes:
  translate([0,0,mount_thickness])
  sideScrewSupports( quantity, distance, screw_head_radius, riserHeight * 2 );
  sideScrewSupports( quantity, distance, screw_radius, riserHeight * 2 );

}


module supportTower(x, distance){
	cube([riserWidth, base_depth, bearing_height]);

	translate([riserWidth/2, base_depth, bearing_height])
	rotate(a=90,v=[1,0,0])
	cylinder($fn=500, r=riserWidth/2 + mount_thickness * 2, h=base_depth);
}

module mountScrewHole(radius){
  translate([riserWidth/2, screw_distance, mount_thickness])
    cylinder(r=radius, h=riserHeight);
}

module base (quantity, distance) {
  translate([riserWidth/2, screw_distance, mount_thickness])
  cylinder(r=riserWidth/2, h=mount_thickness);
}

module frontScrewMount () {
  //hull(){
    cube([riserWidth, 1, mount_thickness]);

    translate([riserWidth/2, -screw_radius * 4, 0])
      cylinder(r=riserWidth/2, h=mount_thickness);
  //}
}

module bearingHole(){
	translate([riserWidth/2, bearing_depth-1, bearing_height])
	rotate(a=90, v=[1,0,0])
  union(){
    cylinder(r = bearing_radius, h = bearing_depth + 1);
    translate([0,0,-mount_thickness])
    cylinder(r = bearing_gap_radius, h = bearing_depth + mount_thickness + 1);
  }
}
